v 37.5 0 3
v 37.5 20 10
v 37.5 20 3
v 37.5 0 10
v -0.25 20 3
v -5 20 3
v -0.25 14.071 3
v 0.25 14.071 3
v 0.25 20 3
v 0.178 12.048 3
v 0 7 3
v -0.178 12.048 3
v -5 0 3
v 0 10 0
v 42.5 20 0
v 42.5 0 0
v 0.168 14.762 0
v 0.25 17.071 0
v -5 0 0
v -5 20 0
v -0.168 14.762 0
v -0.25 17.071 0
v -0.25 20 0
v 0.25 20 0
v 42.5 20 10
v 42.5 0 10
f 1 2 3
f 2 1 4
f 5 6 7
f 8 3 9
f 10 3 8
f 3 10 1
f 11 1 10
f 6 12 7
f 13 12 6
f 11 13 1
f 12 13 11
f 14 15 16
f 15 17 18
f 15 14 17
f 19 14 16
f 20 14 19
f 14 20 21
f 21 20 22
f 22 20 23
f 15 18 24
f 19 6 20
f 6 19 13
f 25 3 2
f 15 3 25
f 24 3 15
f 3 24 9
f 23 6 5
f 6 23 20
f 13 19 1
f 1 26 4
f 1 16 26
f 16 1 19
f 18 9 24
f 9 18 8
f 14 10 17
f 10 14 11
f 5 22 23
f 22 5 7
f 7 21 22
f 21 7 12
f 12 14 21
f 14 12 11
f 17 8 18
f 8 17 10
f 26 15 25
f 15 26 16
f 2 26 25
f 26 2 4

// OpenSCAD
//cylinder(d=17.5, h=37.5);

translate([37.5,0,0]) cube([5,20,10]);

difference(){
translate([-5,0,0]) cube([37.5+5,20,3]);


translate([0,60,-50])
rotate([45,0,0])
linear_extrude(100)
polygon([[0,0],[0.25, 5],[0.25,100],[-0.25,100],[-0.25,5]]);}
